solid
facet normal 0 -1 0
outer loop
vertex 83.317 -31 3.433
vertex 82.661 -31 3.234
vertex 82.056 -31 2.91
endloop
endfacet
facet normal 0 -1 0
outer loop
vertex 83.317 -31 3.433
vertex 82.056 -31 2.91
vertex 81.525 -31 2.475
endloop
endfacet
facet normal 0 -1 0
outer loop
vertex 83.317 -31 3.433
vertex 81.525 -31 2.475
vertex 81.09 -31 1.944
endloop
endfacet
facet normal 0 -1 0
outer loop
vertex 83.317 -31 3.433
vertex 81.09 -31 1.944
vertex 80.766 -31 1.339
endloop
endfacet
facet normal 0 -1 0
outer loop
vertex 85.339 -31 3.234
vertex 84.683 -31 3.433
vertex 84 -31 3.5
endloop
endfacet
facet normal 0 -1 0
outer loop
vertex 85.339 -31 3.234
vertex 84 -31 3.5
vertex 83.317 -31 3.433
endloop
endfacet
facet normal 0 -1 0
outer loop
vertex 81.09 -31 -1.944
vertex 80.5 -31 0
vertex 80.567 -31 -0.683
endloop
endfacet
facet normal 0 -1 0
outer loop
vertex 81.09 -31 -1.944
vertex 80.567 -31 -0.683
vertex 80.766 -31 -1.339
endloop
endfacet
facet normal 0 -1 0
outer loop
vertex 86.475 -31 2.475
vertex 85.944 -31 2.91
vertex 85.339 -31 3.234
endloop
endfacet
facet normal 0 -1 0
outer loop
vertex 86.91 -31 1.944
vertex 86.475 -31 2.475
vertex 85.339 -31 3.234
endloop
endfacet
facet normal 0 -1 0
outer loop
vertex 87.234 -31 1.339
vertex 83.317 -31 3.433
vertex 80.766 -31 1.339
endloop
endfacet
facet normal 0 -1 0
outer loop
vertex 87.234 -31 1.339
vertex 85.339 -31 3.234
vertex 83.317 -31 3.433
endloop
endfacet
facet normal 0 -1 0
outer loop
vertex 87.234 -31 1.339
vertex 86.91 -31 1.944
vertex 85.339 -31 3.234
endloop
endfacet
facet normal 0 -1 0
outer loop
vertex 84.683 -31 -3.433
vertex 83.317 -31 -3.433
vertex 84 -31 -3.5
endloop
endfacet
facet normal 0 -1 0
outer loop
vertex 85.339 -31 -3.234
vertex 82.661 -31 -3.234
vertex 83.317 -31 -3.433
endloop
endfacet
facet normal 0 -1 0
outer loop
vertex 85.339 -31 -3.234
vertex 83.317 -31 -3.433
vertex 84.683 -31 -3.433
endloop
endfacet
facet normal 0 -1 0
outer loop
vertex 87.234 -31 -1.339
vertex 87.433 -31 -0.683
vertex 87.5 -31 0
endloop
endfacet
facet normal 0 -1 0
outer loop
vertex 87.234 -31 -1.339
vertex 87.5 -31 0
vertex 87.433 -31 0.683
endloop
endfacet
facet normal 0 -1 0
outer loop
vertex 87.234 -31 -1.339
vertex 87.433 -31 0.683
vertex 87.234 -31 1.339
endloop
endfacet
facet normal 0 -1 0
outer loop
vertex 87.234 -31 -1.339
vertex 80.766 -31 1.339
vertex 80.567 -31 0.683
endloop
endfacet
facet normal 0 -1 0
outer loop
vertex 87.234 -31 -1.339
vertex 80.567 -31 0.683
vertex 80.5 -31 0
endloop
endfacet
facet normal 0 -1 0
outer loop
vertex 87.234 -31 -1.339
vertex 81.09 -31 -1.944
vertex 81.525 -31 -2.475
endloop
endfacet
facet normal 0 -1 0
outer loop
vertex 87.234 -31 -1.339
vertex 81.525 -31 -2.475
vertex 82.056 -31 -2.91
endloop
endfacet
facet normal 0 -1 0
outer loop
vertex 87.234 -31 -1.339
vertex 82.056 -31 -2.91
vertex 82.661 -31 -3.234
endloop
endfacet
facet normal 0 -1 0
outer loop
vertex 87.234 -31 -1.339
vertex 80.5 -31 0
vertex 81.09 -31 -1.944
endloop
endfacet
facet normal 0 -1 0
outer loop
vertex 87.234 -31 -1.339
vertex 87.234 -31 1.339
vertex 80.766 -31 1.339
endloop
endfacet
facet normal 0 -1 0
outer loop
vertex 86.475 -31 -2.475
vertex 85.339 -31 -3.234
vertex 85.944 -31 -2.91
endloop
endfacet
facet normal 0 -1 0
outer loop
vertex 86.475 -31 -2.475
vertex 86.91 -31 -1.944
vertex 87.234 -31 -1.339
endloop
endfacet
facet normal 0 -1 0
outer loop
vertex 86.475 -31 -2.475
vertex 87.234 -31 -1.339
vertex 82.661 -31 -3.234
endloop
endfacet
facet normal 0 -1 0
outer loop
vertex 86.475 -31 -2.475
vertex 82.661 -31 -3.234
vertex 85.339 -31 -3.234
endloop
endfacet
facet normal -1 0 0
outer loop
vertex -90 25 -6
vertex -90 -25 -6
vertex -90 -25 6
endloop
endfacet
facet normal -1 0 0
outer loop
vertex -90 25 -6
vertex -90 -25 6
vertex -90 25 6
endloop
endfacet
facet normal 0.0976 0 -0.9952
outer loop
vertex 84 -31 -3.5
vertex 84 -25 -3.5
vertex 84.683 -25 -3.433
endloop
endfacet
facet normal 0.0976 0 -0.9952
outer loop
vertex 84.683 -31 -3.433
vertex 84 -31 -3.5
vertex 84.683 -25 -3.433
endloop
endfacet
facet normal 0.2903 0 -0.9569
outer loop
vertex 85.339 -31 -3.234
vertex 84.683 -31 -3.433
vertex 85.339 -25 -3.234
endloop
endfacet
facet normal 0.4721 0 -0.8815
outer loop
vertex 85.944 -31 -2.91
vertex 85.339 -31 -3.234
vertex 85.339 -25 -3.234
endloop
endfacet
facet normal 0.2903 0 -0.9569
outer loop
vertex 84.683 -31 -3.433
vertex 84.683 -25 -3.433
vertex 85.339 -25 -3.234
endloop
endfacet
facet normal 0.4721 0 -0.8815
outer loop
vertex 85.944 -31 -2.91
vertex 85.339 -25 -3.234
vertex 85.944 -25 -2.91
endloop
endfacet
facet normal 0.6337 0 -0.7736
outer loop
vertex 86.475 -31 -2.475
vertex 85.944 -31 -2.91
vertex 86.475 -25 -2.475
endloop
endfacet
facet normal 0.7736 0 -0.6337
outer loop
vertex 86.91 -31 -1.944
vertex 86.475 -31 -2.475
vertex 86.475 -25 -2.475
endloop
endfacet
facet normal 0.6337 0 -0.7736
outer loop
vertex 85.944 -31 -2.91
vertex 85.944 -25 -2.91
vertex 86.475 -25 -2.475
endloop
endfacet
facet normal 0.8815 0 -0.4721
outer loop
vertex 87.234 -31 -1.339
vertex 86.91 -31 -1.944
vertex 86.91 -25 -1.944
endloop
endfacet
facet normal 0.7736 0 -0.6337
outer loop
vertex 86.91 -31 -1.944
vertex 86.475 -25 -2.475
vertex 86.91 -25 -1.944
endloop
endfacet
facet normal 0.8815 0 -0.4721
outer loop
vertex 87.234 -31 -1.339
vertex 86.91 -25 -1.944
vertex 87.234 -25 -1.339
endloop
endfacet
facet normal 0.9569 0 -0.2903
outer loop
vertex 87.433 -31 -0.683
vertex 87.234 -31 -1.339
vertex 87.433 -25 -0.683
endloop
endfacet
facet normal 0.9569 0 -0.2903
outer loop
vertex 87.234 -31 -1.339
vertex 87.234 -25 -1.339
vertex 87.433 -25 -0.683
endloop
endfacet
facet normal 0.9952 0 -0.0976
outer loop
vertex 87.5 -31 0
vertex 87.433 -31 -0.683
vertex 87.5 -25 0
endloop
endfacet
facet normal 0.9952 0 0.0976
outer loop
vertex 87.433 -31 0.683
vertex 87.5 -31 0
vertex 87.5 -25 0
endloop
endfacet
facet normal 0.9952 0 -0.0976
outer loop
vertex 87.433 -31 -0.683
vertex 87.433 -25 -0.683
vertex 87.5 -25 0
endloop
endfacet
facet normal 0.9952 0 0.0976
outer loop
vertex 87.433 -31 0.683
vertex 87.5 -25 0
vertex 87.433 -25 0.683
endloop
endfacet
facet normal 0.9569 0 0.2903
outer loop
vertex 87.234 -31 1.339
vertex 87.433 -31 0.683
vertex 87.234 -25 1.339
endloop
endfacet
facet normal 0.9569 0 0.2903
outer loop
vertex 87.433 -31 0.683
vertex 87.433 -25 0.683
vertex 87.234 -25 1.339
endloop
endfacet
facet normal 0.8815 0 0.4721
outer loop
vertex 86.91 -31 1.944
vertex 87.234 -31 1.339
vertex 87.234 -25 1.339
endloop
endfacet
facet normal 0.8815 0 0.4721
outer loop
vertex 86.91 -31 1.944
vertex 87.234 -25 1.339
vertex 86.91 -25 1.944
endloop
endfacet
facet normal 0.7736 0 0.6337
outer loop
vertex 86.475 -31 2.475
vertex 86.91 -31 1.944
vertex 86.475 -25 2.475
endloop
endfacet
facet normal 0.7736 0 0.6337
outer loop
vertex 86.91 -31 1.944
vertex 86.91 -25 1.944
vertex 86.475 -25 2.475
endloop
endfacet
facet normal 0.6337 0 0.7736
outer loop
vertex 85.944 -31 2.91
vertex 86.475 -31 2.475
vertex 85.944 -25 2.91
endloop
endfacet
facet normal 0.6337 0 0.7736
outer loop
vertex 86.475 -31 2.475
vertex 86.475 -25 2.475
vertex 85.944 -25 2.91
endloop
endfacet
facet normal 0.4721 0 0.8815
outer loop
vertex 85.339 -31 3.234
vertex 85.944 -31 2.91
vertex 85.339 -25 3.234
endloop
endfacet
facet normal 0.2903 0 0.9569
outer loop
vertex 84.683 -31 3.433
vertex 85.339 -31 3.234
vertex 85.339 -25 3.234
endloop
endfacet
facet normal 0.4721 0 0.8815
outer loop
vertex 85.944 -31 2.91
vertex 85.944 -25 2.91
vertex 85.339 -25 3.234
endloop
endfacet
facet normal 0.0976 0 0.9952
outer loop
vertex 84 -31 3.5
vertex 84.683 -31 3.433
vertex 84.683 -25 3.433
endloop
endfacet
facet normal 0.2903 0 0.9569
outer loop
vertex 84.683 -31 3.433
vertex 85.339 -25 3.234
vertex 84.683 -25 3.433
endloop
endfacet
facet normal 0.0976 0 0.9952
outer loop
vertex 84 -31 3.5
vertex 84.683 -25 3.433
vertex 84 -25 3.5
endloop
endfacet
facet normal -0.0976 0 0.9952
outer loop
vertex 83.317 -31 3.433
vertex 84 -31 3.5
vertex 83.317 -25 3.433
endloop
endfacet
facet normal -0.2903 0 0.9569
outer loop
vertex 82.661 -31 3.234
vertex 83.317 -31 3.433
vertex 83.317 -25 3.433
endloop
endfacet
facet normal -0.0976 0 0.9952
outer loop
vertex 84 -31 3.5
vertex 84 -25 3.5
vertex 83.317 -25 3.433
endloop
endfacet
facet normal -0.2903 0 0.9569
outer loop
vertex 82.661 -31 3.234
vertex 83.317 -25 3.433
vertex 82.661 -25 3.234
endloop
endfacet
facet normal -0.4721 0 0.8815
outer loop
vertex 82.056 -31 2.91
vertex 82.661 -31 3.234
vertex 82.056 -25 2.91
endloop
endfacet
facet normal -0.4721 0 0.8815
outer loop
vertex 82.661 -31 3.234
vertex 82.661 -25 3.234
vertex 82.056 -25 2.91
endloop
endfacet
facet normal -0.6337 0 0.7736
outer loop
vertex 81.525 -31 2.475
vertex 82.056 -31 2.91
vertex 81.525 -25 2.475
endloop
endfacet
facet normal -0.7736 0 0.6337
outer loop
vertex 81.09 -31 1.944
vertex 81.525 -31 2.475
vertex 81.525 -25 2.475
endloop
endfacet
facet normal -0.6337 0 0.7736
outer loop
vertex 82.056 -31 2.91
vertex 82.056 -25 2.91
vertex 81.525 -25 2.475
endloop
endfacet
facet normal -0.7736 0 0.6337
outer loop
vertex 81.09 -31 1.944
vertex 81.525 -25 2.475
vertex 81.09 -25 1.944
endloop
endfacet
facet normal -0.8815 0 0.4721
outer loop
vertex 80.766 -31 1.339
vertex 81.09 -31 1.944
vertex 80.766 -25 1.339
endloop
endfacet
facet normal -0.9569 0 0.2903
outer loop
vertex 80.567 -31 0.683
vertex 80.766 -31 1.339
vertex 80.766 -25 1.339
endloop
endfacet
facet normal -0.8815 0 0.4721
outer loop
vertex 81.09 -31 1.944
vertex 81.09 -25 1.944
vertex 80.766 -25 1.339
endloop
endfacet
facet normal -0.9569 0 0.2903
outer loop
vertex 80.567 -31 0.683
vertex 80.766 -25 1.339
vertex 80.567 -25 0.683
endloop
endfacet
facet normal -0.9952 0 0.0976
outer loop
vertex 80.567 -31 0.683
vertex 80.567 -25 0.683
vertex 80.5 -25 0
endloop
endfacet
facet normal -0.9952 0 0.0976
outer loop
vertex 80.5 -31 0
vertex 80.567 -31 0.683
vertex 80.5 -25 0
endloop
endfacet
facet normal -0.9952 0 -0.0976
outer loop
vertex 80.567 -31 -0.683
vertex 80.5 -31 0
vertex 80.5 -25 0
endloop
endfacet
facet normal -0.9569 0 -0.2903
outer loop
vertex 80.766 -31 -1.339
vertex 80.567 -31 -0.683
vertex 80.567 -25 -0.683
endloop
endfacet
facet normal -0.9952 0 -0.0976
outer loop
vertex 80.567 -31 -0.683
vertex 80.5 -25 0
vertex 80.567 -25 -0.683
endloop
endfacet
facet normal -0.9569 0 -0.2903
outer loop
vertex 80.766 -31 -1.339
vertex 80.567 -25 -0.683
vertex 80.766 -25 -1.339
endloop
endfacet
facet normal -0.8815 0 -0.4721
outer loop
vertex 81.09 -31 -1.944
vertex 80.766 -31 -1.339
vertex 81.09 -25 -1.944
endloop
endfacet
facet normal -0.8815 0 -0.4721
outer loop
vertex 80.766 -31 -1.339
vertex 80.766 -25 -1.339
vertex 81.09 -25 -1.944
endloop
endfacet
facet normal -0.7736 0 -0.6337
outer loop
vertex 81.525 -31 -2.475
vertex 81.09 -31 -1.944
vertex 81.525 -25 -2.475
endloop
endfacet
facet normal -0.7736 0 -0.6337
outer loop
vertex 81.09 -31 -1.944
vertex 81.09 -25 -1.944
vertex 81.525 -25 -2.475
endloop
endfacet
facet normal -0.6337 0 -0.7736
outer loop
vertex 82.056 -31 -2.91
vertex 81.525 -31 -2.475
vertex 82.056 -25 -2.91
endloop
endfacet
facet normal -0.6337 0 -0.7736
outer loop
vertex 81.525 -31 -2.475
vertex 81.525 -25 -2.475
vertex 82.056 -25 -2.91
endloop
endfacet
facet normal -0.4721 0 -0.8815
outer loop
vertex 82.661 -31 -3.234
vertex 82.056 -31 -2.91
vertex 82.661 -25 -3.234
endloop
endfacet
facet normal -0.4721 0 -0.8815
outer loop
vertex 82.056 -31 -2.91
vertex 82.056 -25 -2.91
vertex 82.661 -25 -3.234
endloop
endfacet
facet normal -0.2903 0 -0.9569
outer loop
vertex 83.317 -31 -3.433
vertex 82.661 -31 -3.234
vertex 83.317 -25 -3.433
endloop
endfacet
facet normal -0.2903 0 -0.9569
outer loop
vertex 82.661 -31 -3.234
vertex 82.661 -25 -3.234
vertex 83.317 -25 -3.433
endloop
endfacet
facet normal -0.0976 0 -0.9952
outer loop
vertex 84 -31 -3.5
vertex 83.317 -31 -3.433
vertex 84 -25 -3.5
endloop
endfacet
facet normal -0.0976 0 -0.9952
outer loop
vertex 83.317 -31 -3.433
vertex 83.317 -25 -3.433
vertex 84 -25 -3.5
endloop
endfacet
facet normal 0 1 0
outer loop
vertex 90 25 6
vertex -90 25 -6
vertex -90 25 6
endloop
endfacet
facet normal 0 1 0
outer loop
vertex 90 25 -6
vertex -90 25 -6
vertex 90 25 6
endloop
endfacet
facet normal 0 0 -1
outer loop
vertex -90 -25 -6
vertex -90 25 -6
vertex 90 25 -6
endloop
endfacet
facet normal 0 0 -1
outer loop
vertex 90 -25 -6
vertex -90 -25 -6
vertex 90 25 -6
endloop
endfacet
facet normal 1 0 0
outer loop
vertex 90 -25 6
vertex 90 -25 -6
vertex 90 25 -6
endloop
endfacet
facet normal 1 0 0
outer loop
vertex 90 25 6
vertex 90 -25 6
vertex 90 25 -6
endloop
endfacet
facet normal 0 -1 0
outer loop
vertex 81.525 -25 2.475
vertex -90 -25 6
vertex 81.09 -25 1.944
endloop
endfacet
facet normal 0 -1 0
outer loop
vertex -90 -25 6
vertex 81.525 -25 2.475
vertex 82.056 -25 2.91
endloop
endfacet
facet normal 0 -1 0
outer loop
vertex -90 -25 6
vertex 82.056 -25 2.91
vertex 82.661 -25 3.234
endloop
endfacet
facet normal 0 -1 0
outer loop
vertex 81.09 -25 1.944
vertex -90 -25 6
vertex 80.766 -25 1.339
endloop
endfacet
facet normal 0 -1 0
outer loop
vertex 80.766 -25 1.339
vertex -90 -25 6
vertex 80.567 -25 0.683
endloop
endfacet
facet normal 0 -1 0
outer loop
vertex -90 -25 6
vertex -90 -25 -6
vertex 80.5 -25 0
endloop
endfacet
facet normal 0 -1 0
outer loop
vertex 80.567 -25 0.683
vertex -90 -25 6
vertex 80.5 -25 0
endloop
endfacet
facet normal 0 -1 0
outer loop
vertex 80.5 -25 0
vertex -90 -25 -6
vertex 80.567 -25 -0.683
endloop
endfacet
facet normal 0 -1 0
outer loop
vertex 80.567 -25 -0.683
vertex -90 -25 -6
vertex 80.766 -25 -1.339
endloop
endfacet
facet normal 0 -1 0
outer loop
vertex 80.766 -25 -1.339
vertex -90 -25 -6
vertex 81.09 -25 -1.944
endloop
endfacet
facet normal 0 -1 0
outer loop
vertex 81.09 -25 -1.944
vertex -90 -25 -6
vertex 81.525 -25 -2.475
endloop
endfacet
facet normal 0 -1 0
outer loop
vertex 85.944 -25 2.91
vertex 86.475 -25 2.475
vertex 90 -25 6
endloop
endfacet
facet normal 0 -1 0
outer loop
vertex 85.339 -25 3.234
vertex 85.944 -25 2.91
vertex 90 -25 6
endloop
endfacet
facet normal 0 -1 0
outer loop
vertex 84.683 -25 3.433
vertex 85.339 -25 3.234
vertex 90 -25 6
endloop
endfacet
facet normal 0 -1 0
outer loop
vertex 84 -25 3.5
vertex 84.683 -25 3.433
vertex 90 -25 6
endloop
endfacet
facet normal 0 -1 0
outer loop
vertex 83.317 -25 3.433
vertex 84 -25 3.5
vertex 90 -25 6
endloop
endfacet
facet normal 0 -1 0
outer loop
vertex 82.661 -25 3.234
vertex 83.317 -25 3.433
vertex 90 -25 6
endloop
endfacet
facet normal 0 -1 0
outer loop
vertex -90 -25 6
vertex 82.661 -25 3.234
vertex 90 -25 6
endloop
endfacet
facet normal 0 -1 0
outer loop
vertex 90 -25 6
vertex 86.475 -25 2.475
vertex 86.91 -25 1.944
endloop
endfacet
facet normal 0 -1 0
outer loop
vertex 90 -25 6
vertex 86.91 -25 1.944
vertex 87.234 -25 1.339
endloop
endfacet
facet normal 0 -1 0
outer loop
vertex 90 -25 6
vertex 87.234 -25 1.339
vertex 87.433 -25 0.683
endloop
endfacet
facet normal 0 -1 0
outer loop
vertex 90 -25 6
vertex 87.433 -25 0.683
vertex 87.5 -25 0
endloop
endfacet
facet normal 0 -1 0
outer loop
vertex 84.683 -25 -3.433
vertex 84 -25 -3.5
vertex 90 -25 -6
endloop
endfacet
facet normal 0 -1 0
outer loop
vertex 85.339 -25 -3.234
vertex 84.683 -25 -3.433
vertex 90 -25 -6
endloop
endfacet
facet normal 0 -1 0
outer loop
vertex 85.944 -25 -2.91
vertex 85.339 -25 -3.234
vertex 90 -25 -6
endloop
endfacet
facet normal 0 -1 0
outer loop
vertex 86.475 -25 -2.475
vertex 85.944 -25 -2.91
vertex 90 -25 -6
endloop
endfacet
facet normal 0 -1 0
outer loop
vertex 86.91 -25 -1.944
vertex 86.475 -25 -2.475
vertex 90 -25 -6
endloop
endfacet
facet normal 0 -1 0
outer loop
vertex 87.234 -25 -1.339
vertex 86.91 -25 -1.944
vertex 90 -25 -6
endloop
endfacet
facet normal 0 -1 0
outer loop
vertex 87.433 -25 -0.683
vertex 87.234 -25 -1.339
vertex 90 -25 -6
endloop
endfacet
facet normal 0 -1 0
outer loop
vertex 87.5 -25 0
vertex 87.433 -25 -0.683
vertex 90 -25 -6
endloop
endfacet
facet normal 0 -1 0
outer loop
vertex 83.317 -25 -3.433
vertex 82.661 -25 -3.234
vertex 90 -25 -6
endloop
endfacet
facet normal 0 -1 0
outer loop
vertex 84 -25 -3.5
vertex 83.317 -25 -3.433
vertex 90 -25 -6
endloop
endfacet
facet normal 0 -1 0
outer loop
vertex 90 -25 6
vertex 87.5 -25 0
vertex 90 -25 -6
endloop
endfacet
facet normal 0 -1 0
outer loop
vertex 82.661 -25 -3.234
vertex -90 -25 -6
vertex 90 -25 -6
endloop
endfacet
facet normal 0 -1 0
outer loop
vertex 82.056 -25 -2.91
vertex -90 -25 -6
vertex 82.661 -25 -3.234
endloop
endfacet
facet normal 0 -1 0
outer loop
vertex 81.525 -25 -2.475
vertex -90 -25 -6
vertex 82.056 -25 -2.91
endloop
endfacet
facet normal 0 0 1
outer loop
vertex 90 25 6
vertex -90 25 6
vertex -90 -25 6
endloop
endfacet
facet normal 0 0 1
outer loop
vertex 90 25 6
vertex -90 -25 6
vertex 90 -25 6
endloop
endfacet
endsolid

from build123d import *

# Parameters (mm, degrees)
BOSS_EXTRUDE2_DEPTH      = 6
BOSS_EXTRUDE2_DEPTH_BACK = 6
SKETCH1_W                = 180
SKETCH1_H                = 50
SKETCH3_R                = 3.5
BOSS_EXTRUDE3_DEPTH      = 6


with BuildPart() as part:
    # Sketch1 → Boss-Extrude2 (new, two sides: drawn at the far end of the back side and taken through both)
    with BuildSketch(Plane.XY.offset(-BOSS_EXTRUDE2_DEPTH_BACK)):
        Rectangle(SKETCH1_W, SKETCH1_H)
    extrude(amount=BOSS_EXTRUDE2_DEPTH + BOSS_EXTRUDE2_DEPTH_BACK)

    # Sketch3 → Boss-Extrude3 (add)
    with BuildSketch(Plane.XZ.offset(25)):
        with Locations((84, 0)):
            Circle(SKETCH3_R)
    extrude(amount=BOSS_EXTRUDE3_DEPTH)


solid = part.part
